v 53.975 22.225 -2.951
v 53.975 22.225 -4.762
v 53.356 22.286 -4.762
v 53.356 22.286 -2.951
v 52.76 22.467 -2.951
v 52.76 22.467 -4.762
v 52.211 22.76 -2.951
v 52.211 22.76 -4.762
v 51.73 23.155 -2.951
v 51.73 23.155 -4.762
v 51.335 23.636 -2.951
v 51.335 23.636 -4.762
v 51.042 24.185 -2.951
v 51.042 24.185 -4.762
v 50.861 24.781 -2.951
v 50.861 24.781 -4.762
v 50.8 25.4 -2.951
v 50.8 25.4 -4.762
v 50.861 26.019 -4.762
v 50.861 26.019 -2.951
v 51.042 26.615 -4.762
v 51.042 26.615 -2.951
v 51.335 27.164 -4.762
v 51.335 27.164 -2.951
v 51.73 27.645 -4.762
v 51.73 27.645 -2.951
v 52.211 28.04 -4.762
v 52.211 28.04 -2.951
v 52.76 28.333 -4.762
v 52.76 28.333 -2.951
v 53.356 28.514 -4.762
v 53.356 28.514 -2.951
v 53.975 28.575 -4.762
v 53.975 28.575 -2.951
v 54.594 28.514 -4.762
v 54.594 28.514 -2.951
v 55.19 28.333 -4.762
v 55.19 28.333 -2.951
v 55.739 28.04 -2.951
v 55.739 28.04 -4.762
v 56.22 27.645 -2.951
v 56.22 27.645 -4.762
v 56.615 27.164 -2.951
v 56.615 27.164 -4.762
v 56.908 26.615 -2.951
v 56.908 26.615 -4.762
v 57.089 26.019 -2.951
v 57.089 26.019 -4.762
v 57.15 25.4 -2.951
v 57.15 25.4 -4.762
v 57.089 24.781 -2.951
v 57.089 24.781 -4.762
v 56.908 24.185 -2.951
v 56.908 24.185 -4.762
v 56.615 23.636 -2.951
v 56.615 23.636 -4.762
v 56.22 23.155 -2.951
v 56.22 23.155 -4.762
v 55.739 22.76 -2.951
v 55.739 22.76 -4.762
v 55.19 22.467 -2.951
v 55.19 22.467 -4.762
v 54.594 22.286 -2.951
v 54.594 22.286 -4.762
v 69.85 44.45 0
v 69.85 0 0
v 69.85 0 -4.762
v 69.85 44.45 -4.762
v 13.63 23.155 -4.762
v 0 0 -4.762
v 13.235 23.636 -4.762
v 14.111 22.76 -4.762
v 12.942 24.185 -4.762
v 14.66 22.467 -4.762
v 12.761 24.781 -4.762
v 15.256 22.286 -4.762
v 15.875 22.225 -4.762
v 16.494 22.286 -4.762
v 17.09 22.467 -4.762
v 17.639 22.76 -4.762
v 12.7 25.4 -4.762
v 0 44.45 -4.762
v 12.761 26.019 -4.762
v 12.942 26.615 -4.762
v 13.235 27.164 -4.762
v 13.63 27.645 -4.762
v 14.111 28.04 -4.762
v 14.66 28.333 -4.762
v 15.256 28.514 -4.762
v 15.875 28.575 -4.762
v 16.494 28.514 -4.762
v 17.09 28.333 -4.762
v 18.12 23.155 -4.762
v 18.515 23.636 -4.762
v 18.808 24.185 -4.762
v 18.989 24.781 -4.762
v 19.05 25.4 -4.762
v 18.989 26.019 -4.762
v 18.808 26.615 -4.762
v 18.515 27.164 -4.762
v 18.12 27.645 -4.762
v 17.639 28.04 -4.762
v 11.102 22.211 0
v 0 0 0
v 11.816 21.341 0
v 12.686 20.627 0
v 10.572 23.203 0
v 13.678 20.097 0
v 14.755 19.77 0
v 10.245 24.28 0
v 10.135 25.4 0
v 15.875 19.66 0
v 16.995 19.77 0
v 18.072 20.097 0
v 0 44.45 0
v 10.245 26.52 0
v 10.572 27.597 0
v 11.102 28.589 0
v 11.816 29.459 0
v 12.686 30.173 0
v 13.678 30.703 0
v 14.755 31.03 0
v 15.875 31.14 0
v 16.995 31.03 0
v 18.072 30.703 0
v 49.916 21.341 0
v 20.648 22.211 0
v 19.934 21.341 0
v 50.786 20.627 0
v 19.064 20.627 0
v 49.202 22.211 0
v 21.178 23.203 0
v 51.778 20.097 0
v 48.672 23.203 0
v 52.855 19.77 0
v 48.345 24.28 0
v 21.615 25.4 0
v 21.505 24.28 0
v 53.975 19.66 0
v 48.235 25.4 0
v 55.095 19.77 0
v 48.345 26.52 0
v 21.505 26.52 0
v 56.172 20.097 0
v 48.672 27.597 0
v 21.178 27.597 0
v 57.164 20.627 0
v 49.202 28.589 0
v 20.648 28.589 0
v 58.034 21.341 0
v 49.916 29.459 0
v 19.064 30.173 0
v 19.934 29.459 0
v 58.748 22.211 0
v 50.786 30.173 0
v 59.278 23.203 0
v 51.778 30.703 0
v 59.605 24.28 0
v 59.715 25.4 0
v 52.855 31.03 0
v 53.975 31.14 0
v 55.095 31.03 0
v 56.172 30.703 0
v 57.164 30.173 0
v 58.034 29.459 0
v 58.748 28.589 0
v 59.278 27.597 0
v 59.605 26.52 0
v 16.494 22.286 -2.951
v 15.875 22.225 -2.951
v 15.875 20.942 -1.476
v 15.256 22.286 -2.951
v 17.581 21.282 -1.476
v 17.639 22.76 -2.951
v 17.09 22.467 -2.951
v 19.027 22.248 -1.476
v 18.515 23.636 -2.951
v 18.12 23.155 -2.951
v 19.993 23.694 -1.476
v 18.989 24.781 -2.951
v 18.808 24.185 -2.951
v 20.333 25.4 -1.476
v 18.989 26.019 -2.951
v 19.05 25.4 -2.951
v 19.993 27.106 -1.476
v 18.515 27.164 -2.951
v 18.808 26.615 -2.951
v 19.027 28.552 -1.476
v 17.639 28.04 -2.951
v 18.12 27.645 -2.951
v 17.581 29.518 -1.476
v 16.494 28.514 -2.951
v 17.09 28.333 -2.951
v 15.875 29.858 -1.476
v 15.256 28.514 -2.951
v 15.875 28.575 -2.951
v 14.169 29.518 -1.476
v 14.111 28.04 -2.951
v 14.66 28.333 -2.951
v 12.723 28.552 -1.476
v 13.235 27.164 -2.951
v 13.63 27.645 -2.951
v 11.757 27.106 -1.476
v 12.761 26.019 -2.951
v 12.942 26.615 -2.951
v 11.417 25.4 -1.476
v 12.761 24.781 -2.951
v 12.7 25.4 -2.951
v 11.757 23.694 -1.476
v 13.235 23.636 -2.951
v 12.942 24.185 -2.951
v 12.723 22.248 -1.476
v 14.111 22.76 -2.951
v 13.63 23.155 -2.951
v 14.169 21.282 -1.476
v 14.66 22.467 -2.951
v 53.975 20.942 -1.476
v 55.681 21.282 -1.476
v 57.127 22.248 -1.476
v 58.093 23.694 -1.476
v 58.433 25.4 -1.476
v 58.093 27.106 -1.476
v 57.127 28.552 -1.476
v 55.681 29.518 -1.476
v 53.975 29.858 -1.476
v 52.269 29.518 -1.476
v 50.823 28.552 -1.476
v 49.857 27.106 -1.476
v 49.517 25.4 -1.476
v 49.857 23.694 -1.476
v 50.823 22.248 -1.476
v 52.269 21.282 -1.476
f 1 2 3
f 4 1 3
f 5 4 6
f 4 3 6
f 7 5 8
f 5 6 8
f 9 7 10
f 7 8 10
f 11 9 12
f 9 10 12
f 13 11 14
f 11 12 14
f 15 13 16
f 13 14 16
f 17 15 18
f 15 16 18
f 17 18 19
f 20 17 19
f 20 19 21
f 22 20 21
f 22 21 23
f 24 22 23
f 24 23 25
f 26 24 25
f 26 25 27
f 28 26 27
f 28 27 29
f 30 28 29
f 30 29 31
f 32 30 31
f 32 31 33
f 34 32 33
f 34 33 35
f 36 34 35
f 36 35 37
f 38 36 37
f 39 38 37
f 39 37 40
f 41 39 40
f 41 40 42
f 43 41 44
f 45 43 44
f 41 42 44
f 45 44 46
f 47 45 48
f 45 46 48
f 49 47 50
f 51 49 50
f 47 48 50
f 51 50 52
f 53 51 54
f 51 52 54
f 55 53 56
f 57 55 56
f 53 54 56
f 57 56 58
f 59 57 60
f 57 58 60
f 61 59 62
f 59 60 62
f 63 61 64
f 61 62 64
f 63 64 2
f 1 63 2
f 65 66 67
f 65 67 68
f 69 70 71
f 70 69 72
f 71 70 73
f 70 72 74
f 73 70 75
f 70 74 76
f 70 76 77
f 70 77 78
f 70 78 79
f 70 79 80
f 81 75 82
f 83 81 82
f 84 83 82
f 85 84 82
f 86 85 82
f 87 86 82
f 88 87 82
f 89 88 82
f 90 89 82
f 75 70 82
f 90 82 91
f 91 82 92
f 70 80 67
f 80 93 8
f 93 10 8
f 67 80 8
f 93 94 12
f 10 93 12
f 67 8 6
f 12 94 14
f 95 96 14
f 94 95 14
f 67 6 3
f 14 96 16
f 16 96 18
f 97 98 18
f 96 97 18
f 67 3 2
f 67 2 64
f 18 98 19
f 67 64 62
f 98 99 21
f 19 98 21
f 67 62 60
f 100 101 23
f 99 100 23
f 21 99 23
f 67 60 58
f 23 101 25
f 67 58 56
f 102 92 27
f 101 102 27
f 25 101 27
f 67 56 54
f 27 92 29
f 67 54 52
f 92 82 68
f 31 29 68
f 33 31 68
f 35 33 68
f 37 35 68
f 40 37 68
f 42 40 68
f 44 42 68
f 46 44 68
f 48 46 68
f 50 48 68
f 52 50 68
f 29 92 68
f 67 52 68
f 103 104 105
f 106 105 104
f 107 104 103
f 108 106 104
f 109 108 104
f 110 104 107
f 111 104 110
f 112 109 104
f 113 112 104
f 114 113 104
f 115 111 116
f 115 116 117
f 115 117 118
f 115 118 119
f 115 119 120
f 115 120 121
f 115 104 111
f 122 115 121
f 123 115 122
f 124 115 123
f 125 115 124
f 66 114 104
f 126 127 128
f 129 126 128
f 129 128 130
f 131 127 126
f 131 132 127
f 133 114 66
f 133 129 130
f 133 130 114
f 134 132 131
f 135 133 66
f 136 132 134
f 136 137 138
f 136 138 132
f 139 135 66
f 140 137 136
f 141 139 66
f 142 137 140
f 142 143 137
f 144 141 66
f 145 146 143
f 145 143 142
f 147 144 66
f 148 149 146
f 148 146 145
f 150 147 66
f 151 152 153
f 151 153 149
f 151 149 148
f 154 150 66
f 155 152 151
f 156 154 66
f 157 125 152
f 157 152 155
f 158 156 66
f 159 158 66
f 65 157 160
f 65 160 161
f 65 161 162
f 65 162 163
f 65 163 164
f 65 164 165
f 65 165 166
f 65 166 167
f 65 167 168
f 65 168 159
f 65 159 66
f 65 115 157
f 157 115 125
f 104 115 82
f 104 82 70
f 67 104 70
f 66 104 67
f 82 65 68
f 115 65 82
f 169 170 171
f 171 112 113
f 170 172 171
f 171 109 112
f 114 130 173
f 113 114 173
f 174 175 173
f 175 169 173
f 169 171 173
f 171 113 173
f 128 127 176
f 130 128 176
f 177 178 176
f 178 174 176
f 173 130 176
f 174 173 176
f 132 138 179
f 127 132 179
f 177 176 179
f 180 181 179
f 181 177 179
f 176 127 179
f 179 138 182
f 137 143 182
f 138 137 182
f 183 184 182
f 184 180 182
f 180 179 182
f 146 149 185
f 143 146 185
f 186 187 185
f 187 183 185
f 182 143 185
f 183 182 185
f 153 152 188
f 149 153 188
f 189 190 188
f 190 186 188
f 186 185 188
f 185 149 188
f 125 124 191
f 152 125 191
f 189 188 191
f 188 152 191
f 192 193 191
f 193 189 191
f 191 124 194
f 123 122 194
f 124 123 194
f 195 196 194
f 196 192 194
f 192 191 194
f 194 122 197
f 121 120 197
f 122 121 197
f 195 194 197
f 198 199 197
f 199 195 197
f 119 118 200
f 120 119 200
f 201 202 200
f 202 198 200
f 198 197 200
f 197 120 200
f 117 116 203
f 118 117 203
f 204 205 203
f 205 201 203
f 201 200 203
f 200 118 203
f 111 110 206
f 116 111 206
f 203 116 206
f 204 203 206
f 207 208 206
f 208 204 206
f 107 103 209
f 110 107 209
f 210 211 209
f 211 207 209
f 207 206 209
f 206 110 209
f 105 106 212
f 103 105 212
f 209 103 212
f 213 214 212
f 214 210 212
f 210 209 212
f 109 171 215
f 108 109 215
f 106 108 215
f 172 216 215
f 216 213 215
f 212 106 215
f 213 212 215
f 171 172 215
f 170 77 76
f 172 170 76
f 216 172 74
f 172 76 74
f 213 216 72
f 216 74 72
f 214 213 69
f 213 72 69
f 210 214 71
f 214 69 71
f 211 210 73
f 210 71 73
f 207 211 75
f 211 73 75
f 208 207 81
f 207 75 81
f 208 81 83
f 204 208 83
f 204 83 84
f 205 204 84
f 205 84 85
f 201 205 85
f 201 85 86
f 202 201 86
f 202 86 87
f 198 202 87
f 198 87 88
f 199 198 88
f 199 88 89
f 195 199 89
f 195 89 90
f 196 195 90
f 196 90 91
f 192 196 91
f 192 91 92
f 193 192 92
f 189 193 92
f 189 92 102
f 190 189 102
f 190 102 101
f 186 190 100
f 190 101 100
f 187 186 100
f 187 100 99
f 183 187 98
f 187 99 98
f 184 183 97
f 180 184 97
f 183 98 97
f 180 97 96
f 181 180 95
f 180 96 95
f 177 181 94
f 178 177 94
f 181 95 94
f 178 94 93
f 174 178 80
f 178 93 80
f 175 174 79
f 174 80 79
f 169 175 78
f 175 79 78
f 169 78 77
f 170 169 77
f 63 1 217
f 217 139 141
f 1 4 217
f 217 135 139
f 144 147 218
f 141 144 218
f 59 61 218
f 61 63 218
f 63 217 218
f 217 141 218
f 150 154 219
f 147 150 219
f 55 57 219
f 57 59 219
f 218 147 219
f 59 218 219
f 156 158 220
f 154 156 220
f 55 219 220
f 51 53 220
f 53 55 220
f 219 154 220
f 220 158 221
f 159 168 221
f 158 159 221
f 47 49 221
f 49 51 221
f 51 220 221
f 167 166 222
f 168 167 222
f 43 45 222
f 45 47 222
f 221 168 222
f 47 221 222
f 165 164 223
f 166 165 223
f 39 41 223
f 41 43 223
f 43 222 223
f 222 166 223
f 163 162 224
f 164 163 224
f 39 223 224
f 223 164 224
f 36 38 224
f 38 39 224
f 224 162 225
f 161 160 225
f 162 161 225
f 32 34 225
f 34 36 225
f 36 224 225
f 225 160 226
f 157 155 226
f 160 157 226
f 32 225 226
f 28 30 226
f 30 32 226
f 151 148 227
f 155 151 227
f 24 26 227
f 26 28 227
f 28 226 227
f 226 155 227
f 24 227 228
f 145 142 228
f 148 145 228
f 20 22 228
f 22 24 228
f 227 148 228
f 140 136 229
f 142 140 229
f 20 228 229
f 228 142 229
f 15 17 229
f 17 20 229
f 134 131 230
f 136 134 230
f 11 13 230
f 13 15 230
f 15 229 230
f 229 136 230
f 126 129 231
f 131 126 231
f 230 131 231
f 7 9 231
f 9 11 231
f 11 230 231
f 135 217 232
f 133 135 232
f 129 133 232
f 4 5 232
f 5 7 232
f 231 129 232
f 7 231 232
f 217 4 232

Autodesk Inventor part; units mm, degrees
ref_plane "YZ Plane" through (0, 0, 0) normal (1, 0, 0) x (0, 1, 0)
ref_plane "XZ Plane" through (0, 0, 0) normal (0, 1, 0) x (-1, 0, 0)
ref_plane "XY Plane" through (0, 0, 0) normal (0, 0, 1) x (1, 0, 0)
sketch "Sketch1" plane through (0, 0, 0) normal (0, 0, 1) x (1, 0, 0)
  line L0 (0, 0) -> (69.85, 0)
  line L1 (69.85, 0) -> (69.85, 44.45)
  line L2 (69.85, 44.45) -> (0, 44.45)
  line L3 (0, 44.45) -> (0, 0)
  dimension "d0" = 69.85
  dimension "d1" = 44.45
extrude "Extrusion1" add sketch "Sketch1" against normal blind 4.7625
hole "Hole1" at (15.875, 25.4, 0) direction (0, 0, -1) diameter 6.35 end through all countersink diameter 11.4808 countersink angle 82
hole "Hole2" at (53.975, 25.4, 0) direction (0, 0, -1) diameter 6.35 end through all countersink diameter 11.4808 countersink angle 82
properties part number "VS-003 (JAW PLATE)" material "Steel, Alloy"
